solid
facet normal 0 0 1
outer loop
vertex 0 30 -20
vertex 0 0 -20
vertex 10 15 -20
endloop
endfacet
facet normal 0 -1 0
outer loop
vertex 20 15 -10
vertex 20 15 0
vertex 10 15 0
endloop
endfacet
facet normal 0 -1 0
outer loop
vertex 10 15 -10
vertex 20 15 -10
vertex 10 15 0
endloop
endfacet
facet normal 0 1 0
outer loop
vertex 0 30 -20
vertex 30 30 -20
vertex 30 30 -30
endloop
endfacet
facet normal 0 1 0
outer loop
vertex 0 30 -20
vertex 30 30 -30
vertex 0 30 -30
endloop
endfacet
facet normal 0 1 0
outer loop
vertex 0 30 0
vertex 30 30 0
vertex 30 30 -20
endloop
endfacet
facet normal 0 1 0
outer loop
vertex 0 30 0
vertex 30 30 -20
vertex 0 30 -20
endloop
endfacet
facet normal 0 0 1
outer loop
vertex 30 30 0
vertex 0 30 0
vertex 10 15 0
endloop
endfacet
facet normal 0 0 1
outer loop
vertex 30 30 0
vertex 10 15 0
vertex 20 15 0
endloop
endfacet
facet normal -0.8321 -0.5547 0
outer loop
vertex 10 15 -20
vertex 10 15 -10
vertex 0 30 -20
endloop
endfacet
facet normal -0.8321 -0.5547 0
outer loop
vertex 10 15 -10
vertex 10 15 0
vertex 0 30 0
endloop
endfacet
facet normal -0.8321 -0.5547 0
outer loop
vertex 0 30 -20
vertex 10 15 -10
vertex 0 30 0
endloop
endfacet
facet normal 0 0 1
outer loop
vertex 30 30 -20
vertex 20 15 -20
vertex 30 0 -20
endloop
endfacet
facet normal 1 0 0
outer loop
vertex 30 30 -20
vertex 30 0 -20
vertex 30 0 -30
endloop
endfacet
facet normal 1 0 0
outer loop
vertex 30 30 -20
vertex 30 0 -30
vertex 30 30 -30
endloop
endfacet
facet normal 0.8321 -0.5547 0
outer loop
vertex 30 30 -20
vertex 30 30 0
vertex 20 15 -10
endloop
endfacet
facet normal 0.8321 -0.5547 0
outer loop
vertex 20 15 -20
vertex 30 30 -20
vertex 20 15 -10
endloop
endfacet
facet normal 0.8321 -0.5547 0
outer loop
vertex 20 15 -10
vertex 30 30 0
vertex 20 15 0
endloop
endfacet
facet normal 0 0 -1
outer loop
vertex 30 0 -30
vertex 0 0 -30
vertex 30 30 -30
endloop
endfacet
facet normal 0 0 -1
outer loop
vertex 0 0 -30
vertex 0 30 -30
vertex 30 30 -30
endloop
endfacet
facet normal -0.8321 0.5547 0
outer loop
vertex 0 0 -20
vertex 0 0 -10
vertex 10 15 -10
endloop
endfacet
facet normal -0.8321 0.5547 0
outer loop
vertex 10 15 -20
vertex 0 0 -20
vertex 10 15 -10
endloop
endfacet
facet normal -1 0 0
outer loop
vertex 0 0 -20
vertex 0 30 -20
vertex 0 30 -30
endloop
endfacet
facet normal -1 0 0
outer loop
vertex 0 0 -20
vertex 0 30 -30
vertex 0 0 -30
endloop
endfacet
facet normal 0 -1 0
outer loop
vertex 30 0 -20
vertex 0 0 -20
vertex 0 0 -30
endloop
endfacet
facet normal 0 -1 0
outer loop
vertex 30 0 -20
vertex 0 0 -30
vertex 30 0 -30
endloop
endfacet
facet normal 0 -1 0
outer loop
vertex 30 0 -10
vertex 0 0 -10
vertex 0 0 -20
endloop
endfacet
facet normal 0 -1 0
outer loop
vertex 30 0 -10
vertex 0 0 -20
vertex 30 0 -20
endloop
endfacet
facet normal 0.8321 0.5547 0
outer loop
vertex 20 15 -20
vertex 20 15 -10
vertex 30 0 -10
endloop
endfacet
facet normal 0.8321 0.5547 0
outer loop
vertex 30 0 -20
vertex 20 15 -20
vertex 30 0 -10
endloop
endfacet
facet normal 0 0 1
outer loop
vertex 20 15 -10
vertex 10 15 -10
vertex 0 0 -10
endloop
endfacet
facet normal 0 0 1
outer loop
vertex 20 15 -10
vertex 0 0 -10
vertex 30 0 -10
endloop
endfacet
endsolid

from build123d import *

# Parameters (mm, degrees)
F1_DEPTH = 30
F2_DEPTH = 10
F3_DEPTH = 20


with BuildPart() as f1:
    # F0 (on Top) → F1 (new body)
    with BuildSketch(Plane.XY):
        Polygon((10, 15), (0, 0), (30, 0), (20, 15), align=None)
        Polygon((0, 30), (0, 0), (10, 15), align=None)
        Polygon((20, 15), (30, 0), (30, 30), align=None)
        Polygon((30, 30), (0, 30), (10, 15), (20, 15), align=None)
    extrude(amount=-F1_DEPTH)

    # F0 (on Top) → F2 (cut)
    with BuildSketch(Plane.XY):
        Polygon((10, 15), (0, 0), (30, 0), (20, 15), align=None)
    extrude(amount=-F2_DEPTH, mode=Mode.SUBTRACT)

    # F0 (on Top) → F3 (cut)
    with BuildSketch(Plane.XY):
        Polygon((0, 30), (0, 0), (10, 15), align=None)
        Polygon((20, 15), (30, 0), (30, 30), align=None)
    extrude(amount=-F3_DEPTH, mode=Mode.SUBTRACT)


solid = f1.part
